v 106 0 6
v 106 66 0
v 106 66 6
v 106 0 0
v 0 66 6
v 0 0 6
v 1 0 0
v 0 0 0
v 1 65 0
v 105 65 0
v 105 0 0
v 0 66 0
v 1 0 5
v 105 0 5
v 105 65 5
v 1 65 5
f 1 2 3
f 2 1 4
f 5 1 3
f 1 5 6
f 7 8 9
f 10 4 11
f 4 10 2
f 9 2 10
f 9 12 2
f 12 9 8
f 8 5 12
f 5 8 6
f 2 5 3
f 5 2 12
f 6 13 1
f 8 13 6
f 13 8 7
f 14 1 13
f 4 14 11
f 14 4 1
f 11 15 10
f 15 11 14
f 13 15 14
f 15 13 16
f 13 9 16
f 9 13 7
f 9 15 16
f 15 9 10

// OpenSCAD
/*
 * Skjermhette til Ender 3
 */
 
bredde = 106;
hoyde =  66;
tykkelse = 1;
kant = 5;

difference() {
    cube([bredde,hoyde,tykkelse+kant]);
    translate([tykkelse,0,0])
        cube([bredde-tykkelse*2,hoyde-tykkelse,kant]);
    echo(bredde-tykkelse*2, hoyde-tykkelse, kant-tykkelse);
}
